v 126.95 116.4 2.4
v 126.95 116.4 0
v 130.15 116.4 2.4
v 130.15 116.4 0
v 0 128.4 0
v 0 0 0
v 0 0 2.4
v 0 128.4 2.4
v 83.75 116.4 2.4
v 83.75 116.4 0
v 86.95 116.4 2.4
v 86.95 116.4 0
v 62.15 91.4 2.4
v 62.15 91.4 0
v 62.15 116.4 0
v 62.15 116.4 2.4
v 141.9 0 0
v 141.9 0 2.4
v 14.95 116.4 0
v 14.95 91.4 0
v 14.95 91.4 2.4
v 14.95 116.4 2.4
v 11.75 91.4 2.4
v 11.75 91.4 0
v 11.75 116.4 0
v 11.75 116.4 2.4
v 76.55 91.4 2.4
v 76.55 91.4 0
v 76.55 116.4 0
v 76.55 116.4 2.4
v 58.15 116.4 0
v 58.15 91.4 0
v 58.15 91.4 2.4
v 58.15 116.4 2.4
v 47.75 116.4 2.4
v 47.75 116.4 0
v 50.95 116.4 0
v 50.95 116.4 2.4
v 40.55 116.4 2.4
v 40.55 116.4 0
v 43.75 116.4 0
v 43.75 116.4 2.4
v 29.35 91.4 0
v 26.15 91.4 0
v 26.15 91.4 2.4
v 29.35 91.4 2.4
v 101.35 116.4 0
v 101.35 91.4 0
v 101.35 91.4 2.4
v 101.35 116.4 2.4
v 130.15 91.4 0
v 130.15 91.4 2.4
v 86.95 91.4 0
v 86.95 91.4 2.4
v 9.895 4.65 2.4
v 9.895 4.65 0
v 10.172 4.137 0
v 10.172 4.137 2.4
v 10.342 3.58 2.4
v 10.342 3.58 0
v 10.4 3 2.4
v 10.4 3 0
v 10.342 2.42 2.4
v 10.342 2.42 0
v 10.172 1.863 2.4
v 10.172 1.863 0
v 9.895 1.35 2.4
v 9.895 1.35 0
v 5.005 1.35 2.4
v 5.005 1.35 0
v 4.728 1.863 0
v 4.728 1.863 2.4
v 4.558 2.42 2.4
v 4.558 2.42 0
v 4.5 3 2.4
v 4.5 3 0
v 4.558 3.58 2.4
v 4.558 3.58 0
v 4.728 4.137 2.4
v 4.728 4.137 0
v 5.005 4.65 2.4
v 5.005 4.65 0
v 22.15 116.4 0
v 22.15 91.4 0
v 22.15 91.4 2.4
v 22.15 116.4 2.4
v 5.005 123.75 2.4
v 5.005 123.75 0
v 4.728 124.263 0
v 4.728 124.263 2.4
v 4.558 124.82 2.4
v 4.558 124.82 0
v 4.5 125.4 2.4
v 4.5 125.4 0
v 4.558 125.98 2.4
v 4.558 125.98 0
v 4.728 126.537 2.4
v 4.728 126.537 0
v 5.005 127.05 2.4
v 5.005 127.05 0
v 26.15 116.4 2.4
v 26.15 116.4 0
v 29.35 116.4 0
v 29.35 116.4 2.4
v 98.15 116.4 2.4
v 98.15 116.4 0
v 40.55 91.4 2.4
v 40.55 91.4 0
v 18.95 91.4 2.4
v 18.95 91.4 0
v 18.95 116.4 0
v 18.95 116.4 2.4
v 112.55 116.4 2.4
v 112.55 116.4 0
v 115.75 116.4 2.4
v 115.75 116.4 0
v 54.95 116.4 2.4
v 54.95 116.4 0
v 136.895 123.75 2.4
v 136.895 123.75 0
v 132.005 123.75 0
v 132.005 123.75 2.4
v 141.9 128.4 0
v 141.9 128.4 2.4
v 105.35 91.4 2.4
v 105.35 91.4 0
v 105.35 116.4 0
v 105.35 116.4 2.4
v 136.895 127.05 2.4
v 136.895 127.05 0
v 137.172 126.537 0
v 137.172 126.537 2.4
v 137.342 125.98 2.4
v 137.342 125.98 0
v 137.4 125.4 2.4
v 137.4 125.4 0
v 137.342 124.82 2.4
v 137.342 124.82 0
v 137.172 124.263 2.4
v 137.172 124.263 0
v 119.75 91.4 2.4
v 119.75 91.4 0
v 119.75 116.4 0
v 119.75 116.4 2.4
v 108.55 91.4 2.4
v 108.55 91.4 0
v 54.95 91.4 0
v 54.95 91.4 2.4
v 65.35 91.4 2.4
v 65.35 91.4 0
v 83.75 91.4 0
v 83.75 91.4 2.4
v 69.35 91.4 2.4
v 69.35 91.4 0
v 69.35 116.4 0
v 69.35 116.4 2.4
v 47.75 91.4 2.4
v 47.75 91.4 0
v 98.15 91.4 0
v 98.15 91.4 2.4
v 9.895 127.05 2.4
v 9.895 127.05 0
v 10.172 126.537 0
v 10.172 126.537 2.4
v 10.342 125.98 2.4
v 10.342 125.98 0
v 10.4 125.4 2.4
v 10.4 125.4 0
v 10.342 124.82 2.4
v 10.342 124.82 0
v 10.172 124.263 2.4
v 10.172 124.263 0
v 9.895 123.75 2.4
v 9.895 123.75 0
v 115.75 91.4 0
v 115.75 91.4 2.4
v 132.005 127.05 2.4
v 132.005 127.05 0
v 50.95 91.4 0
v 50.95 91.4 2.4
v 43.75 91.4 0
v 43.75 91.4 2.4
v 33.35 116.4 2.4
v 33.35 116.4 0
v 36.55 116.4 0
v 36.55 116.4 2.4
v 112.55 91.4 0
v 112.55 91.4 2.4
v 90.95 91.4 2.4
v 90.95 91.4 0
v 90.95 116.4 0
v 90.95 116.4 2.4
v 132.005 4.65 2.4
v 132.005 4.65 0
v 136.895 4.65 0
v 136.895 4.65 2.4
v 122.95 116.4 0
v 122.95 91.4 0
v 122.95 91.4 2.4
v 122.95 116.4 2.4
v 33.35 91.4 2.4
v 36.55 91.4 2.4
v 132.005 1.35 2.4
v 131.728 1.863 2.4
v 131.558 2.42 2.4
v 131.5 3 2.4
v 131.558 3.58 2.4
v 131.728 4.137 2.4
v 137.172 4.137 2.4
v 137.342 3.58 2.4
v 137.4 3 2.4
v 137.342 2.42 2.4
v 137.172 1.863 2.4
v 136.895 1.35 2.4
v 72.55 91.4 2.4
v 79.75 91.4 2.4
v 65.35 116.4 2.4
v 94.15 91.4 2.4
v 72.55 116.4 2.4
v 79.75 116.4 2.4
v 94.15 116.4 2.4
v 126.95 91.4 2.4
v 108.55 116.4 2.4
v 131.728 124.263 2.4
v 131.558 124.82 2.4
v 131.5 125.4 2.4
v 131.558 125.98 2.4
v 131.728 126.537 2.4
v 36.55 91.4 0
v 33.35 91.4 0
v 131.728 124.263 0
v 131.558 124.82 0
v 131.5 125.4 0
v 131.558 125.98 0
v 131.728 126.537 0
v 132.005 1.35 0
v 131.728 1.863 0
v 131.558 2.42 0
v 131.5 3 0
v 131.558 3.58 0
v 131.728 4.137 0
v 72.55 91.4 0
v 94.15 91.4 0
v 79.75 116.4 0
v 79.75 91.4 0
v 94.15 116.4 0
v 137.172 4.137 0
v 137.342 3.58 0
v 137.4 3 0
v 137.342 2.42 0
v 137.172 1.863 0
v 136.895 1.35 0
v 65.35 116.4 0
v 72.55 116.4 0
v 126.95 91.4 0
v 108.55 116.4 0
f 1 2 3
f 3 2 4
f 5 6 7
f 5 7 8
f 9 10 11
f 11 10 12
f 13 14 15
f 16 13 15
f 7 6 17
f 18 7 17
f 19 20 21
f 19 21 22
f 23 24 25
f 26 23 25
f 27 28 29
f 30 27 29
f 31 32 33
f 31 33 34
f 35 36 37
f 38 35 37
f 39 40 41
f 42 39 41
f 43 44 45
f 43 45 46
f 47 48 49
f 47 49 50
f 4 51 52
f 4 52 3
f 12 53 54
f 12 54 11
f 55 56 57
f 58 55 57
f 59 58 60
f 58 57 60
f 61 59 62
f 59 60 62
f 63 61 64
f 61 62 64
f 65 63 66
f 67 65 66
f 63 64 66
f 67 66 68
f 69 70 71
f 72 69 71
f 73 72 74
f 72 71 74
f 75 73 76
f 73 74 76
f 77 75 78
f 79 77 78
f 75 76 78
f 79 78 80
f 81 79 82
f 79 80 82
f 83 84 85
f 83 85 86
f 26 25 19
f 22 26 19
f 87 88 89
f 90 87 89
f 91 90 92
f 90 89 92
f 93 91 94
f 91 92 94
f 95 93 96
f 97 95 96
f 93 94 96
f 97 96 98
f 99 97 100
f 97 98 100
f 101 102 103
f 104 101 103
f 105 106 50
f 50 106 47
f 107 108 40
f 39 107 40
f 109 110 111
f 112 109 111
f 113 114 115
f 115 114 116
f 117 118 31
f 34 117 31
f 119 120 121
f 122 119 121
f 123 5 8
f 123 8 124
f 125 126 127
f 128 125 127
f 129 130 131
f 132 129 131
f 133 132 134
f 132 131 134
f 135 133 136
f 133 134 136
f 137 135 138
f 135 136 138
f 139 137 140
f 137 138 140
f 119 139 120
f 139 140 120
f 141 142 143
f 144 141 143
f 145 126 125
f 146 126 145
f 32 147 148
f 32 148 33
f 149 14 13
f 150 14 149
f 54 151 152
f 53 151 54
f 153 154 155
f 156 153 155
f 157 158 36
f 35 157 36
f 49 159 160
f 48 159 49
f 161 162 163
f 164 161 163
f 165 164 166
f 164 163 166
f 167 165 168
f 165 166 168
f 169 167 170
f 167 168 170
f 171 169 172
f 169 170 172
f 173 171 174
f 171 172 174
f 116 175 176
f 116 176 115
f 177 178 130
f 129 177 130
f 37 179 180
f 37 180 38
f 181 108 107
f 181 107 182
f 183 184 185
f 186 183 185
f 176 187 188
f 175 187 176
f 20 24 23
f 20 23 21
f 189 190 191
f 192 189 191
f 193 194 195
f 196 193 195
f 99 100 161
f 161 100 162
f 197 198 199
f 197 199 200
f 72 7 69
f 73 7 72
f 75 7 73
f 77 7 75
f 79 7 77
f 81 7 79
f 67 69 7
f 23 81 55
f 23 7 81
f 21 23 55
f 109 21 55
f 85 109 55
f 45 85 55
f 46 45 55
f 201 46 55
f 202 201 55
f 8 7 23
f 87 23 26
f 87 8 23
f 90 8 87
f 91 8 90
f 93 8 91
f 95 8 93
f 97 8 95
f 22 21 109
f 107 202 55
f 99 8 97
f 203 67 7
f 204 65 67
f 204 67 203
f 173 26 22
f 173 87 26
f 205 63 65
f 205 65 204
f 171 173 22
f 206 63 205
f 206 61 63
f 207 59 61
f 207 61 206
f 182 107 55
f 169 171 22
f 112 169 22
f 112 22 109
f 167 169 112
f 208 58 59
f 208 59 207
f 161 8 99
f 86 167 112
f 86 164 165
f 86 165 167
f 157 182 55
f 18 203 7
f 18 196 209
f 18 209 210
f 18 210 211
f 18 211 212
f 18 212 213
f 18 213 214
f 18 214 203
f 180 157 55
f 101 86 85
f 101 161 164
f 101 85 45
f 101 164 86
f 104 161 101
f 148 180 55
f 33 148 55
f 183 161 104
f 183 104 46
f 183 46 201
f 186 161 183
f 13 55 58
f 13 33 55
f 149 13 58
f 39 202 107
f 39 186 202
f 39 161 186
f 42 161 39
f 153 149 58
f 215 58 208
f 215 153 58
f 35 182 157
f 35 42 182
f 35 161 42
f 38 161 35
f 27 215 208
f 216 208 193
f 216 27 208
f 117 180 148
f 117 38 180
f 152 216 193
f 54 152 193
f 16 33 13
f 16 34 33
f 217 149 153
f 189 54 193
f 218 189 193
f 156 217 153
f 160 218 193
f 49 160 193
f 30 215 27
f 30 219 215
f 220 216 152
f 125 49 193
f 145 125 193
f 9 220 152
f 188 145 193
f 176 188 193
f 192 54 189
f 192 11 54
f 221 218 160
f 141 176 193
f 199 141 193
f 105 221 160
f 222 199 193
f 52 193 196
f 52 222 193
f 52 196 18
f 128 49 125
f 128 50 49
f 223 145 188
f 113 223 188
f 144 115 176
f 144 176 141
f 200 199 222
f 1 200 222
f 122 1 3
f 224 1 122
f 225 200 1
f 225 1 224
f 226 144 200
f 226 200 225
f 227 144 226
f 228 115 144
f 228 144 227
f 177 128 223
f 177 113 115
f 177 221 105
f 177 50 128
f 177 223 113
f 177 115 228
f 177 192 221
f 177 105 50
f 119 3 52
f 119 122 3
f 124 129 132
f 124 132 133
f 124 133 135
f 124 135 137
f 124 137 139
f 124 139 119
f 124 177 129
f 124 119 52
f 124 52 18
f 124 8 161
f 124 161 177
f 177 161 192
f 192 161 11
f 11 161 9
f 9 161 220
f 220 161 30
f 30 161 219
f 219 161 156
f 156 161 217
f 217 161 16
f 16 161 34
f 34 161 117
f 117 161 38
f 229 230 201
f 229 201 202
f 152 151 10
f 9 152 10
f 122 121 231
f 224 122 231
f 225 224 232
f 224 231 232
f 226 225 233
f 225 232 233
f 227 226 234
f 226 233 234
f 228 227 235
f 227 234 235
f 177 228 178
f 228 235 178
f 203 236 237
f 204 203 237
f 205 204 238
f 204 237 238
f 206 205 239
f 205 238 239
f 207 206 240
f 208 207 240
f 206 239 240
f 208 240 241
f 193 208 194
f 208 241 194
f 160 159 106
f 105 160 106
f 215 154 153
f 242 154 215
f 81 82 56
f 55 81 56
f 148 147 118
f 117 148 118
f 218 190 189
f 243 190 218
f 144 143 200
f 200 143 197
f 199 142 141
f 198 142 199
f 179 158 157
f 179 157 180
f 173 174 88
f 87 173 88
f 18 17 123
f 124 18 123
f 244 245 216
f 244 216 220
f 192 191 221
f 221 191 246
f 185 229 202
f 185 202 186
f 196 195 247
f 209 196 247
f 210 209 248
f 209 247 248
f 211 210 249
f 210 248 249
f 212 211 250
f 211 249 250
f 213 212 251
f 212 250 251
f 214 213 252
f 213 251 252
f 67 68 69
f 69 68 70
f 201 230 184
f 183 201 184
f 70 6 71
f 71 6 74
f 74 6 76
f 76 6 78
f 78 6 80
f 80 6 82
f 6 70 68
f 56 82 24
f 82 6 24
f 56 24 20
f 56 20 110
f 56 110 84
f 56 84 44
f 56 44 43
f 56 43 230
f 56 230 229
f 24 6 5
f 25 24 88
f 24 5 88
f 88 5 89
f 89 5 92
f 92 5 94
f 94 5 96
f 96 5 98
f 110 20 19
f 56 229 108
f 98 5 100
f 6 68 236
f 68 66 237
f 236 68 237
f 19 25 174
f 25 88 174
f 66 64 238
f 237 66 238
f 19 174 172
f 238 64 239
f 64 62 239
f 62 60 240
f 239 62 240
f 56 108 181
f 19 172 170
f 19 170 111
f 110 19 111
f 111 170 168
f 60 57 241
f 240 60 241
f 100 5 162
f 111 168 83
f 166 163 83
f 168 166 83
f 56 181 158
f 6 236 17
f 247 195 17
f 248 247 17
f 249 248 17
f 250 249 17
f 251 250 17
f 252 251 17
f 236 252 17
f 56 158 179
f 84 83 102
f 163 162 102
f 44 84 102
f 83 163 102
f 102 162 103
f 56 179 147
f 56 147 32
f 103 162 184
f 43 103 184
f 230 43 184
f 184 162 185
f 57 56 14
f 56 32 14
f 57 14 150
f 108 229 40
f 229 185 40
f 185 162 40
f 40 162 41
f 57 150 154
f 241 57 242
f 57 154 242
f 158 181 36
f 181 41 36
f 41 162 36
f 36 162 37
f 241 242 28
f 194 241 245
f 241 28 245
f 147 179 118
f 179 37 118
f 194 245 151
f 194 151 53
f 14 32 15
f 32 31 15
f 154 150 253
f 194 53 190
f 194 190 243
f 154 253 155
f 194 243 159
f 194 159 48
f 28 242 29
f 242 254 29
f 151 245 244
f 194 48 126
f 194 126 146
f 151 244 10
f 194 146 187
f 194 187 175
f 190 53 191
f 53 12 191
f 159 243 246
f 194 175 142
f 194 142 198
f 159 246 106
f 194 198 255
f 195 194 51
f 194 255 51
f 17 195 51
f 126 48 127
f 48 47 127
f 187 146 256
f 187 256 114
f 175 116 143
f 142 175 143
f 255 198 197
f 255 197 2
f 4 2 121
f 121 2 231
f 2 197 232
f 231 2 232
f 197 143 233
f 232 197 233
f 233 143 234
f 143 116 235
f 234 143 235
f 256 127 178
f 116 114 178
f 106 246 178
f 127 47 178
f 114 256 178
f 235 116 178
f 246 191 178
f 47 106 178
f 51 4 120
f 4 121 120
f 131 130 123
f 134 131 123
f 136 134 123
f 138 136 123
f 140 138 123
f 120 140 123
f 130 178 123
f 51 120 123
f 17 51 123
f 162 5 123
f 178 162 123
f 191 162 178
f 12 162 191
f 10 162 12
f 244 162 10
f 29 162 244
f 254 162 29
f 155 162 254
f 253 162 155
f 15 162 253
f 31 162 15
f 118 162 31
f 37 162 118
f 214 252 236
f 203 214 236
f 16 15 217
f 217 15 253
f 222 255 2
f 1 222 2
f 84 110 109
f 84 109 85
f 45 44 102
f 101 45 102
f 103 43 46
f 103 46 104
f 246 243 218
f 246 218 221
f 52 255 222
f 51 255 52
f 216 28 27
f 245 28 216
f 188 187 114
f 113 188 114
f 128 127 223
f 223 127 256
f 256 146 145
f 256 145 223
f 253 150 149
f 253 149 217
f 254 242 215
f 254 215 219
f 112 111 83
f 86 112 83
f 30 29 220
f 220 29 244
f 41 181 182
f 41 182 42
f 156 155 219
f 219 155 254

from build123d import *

# Parameters (mm, degrees)
MODEL_W            = 141.9
MODEL_H            = 128.4
MODEL_W_2          = 3.2
MODEL_H_2          = 25
BOSS_EXTRU_1_DEPTH = 2.4


with BuildPart() as part:
    # Model → Boss.-Extru.1 (new body)
    with BuildSketch(Plane.XY):
        with Locations((70.95, 64.2)):
            Rectangle(MODEL_W, MODEL_H)
        with BuildLine():
            Line((9.895405778, 123.750002855), (5.004594222, 123.750002855))
            ThreePointArc((5.004594222, 123.750002855), (4.5, 125.40000351), (5.004598148, 127.050002965))
            Line((5.004598148, 127.050002965), (9.895401852, 127.050002965))
            ThreePointArc((9.895401852, 127.050002965), (10.4, 125.40000351), (9.895405778, 123.750002855))
        make_face(mode=Mode.SUBTRACT)
        with BuildLine():
            Line((9.895410076, 1.350004659), (5.004596084, 1.350004659))
            ThreePointArc((5.004596084, 1.350004659), (4.50000308, 3.000002686), (5.004599089, 4.649999794))
            Line((5.004599089, 4.649999794), (9.895407071, 4.649999794))
            ThreePointArc((9.895407071, 4.649999794), (10.40000308, 3.000002686), (9.895410076, 1.350004659))
        make_face(mode=Mode.SUBTRACT)
        with BuildLine():
            Line((136.895403815, 123.749999945), (132.004596185, 123.749999945))
            ThreePointArc((132.004596185, 123.749999945), (131.5, 125.4), (132.004596185, 127.050000055))
            Line((132.004596185, 127.050000055), (136.895403815, 127.050000055))
            ThreePointArc((136.895403815, 127.050000055), (137.4, 125.4), (136.895403815, 123.749999945))
        make_face(mode=Mode.SUBTRACT)
        with BuildLine():
            Line((136.895406895, 1.349999945), (132.004599265, 1.349999945))
            ThreePointArc((132.004599265, 1.349999945), (131.50000308, 3), (132.004599265, 4.650000055))
            Line((132.004599265, 4.650000055), (136.895406895, 4.650000055))
            ThreePointArc((136.895406895, 4.650000055), (137.40000308, 3), (136.895406895, 1.349999945))
        make_face(mode=Mode.SUBTRACT)
        with Locations((13.35, 103.9)):
            Rectangle(MODEL_W_2, MODEL_H_2, mode=Mode.SUBTRACT)
        with Locations((20.55, 103.9)):
            Rectangle(MODEL_W_2, MODEL_H_2, mode=Mode.SUBTRACT)
        with Locations((27.75, 103.9)):
            Rectangle(MODEL_W_2, MODEL_H_2, mode=Mode.SUBTRACT)
        with Locations((34.95, 103.9)):
            Rectangle(MODEL_W_2, MODEL_H_2, mode=Mode.SUBTRACT)
        with Locations((42.15, 103.9)):
            Rectangle(MODEL_W_2, MODEL_H_2, mode=Mode.SUBTRACT)
        with Locations((49.35, 103.9)):
            Rectangle(MODEL_W_2, MODEL_H_2, mode=Mode.SUBTRACT)
        with Locations((56.55, 103.9)):
            Rectangle(MODEL_W_2, MODEL_H_2, mode=Mode.SUBTRACT)
        with Locations((63.75, 103.9)):
            Rectangle(MODEL_W_2, MODEL_H_2, mode=Mode.SUBTRACT)
        with Locations((70.95, 103.9)):
            Rectangle(MODEL_W_2, MODEL_H_2, mode=Mode.SUBTRACT)
        with Locations((78.15, 103.9)):
            Rectangle(MODEL_W_2, MODEL_H_2, mode=Mode.SUBTRACT)
        with Locations((85.35, 103.9)):
            Rectangle(MODEL_W_2, MODEL_H_2, mode=Mode.SUBTRACT)
        with Locations((92.55, 103.9)):
            Rectangle(MODEL_W_2, MODEL_H_2, mode=Mode.SUBTRACT)
        with Locations((99.75, 103.9)):
            Rectangle(MODEL_W_2, MODEL_H_2, mode=Mode.SUBTRACT)
        with Locations((106.95, 103.9)):
            Rectangle(MODEL_W_2, MODEL_H_2, mode=Mode.SUBTRACT)
        with Locations((114.15, 103.9)):
            Rectangle(MODEL_W_2, MODEL_H_2, mode=Mode.SUBTRACT)
        with Locations((121.35, 103.9)):
            Rectangle(MODEL_W_2, MODEL_H_2, mode=Mode.SUBTRACT)
        with Locations((128.55, 103.9)):
            Rectangle(MODEL_W_2, MODEL_H_2, mode=Mode.SUBTRACT)
    extrude(amount=BOSS_EXTRU_1_DEPTH)


solid = part.part
